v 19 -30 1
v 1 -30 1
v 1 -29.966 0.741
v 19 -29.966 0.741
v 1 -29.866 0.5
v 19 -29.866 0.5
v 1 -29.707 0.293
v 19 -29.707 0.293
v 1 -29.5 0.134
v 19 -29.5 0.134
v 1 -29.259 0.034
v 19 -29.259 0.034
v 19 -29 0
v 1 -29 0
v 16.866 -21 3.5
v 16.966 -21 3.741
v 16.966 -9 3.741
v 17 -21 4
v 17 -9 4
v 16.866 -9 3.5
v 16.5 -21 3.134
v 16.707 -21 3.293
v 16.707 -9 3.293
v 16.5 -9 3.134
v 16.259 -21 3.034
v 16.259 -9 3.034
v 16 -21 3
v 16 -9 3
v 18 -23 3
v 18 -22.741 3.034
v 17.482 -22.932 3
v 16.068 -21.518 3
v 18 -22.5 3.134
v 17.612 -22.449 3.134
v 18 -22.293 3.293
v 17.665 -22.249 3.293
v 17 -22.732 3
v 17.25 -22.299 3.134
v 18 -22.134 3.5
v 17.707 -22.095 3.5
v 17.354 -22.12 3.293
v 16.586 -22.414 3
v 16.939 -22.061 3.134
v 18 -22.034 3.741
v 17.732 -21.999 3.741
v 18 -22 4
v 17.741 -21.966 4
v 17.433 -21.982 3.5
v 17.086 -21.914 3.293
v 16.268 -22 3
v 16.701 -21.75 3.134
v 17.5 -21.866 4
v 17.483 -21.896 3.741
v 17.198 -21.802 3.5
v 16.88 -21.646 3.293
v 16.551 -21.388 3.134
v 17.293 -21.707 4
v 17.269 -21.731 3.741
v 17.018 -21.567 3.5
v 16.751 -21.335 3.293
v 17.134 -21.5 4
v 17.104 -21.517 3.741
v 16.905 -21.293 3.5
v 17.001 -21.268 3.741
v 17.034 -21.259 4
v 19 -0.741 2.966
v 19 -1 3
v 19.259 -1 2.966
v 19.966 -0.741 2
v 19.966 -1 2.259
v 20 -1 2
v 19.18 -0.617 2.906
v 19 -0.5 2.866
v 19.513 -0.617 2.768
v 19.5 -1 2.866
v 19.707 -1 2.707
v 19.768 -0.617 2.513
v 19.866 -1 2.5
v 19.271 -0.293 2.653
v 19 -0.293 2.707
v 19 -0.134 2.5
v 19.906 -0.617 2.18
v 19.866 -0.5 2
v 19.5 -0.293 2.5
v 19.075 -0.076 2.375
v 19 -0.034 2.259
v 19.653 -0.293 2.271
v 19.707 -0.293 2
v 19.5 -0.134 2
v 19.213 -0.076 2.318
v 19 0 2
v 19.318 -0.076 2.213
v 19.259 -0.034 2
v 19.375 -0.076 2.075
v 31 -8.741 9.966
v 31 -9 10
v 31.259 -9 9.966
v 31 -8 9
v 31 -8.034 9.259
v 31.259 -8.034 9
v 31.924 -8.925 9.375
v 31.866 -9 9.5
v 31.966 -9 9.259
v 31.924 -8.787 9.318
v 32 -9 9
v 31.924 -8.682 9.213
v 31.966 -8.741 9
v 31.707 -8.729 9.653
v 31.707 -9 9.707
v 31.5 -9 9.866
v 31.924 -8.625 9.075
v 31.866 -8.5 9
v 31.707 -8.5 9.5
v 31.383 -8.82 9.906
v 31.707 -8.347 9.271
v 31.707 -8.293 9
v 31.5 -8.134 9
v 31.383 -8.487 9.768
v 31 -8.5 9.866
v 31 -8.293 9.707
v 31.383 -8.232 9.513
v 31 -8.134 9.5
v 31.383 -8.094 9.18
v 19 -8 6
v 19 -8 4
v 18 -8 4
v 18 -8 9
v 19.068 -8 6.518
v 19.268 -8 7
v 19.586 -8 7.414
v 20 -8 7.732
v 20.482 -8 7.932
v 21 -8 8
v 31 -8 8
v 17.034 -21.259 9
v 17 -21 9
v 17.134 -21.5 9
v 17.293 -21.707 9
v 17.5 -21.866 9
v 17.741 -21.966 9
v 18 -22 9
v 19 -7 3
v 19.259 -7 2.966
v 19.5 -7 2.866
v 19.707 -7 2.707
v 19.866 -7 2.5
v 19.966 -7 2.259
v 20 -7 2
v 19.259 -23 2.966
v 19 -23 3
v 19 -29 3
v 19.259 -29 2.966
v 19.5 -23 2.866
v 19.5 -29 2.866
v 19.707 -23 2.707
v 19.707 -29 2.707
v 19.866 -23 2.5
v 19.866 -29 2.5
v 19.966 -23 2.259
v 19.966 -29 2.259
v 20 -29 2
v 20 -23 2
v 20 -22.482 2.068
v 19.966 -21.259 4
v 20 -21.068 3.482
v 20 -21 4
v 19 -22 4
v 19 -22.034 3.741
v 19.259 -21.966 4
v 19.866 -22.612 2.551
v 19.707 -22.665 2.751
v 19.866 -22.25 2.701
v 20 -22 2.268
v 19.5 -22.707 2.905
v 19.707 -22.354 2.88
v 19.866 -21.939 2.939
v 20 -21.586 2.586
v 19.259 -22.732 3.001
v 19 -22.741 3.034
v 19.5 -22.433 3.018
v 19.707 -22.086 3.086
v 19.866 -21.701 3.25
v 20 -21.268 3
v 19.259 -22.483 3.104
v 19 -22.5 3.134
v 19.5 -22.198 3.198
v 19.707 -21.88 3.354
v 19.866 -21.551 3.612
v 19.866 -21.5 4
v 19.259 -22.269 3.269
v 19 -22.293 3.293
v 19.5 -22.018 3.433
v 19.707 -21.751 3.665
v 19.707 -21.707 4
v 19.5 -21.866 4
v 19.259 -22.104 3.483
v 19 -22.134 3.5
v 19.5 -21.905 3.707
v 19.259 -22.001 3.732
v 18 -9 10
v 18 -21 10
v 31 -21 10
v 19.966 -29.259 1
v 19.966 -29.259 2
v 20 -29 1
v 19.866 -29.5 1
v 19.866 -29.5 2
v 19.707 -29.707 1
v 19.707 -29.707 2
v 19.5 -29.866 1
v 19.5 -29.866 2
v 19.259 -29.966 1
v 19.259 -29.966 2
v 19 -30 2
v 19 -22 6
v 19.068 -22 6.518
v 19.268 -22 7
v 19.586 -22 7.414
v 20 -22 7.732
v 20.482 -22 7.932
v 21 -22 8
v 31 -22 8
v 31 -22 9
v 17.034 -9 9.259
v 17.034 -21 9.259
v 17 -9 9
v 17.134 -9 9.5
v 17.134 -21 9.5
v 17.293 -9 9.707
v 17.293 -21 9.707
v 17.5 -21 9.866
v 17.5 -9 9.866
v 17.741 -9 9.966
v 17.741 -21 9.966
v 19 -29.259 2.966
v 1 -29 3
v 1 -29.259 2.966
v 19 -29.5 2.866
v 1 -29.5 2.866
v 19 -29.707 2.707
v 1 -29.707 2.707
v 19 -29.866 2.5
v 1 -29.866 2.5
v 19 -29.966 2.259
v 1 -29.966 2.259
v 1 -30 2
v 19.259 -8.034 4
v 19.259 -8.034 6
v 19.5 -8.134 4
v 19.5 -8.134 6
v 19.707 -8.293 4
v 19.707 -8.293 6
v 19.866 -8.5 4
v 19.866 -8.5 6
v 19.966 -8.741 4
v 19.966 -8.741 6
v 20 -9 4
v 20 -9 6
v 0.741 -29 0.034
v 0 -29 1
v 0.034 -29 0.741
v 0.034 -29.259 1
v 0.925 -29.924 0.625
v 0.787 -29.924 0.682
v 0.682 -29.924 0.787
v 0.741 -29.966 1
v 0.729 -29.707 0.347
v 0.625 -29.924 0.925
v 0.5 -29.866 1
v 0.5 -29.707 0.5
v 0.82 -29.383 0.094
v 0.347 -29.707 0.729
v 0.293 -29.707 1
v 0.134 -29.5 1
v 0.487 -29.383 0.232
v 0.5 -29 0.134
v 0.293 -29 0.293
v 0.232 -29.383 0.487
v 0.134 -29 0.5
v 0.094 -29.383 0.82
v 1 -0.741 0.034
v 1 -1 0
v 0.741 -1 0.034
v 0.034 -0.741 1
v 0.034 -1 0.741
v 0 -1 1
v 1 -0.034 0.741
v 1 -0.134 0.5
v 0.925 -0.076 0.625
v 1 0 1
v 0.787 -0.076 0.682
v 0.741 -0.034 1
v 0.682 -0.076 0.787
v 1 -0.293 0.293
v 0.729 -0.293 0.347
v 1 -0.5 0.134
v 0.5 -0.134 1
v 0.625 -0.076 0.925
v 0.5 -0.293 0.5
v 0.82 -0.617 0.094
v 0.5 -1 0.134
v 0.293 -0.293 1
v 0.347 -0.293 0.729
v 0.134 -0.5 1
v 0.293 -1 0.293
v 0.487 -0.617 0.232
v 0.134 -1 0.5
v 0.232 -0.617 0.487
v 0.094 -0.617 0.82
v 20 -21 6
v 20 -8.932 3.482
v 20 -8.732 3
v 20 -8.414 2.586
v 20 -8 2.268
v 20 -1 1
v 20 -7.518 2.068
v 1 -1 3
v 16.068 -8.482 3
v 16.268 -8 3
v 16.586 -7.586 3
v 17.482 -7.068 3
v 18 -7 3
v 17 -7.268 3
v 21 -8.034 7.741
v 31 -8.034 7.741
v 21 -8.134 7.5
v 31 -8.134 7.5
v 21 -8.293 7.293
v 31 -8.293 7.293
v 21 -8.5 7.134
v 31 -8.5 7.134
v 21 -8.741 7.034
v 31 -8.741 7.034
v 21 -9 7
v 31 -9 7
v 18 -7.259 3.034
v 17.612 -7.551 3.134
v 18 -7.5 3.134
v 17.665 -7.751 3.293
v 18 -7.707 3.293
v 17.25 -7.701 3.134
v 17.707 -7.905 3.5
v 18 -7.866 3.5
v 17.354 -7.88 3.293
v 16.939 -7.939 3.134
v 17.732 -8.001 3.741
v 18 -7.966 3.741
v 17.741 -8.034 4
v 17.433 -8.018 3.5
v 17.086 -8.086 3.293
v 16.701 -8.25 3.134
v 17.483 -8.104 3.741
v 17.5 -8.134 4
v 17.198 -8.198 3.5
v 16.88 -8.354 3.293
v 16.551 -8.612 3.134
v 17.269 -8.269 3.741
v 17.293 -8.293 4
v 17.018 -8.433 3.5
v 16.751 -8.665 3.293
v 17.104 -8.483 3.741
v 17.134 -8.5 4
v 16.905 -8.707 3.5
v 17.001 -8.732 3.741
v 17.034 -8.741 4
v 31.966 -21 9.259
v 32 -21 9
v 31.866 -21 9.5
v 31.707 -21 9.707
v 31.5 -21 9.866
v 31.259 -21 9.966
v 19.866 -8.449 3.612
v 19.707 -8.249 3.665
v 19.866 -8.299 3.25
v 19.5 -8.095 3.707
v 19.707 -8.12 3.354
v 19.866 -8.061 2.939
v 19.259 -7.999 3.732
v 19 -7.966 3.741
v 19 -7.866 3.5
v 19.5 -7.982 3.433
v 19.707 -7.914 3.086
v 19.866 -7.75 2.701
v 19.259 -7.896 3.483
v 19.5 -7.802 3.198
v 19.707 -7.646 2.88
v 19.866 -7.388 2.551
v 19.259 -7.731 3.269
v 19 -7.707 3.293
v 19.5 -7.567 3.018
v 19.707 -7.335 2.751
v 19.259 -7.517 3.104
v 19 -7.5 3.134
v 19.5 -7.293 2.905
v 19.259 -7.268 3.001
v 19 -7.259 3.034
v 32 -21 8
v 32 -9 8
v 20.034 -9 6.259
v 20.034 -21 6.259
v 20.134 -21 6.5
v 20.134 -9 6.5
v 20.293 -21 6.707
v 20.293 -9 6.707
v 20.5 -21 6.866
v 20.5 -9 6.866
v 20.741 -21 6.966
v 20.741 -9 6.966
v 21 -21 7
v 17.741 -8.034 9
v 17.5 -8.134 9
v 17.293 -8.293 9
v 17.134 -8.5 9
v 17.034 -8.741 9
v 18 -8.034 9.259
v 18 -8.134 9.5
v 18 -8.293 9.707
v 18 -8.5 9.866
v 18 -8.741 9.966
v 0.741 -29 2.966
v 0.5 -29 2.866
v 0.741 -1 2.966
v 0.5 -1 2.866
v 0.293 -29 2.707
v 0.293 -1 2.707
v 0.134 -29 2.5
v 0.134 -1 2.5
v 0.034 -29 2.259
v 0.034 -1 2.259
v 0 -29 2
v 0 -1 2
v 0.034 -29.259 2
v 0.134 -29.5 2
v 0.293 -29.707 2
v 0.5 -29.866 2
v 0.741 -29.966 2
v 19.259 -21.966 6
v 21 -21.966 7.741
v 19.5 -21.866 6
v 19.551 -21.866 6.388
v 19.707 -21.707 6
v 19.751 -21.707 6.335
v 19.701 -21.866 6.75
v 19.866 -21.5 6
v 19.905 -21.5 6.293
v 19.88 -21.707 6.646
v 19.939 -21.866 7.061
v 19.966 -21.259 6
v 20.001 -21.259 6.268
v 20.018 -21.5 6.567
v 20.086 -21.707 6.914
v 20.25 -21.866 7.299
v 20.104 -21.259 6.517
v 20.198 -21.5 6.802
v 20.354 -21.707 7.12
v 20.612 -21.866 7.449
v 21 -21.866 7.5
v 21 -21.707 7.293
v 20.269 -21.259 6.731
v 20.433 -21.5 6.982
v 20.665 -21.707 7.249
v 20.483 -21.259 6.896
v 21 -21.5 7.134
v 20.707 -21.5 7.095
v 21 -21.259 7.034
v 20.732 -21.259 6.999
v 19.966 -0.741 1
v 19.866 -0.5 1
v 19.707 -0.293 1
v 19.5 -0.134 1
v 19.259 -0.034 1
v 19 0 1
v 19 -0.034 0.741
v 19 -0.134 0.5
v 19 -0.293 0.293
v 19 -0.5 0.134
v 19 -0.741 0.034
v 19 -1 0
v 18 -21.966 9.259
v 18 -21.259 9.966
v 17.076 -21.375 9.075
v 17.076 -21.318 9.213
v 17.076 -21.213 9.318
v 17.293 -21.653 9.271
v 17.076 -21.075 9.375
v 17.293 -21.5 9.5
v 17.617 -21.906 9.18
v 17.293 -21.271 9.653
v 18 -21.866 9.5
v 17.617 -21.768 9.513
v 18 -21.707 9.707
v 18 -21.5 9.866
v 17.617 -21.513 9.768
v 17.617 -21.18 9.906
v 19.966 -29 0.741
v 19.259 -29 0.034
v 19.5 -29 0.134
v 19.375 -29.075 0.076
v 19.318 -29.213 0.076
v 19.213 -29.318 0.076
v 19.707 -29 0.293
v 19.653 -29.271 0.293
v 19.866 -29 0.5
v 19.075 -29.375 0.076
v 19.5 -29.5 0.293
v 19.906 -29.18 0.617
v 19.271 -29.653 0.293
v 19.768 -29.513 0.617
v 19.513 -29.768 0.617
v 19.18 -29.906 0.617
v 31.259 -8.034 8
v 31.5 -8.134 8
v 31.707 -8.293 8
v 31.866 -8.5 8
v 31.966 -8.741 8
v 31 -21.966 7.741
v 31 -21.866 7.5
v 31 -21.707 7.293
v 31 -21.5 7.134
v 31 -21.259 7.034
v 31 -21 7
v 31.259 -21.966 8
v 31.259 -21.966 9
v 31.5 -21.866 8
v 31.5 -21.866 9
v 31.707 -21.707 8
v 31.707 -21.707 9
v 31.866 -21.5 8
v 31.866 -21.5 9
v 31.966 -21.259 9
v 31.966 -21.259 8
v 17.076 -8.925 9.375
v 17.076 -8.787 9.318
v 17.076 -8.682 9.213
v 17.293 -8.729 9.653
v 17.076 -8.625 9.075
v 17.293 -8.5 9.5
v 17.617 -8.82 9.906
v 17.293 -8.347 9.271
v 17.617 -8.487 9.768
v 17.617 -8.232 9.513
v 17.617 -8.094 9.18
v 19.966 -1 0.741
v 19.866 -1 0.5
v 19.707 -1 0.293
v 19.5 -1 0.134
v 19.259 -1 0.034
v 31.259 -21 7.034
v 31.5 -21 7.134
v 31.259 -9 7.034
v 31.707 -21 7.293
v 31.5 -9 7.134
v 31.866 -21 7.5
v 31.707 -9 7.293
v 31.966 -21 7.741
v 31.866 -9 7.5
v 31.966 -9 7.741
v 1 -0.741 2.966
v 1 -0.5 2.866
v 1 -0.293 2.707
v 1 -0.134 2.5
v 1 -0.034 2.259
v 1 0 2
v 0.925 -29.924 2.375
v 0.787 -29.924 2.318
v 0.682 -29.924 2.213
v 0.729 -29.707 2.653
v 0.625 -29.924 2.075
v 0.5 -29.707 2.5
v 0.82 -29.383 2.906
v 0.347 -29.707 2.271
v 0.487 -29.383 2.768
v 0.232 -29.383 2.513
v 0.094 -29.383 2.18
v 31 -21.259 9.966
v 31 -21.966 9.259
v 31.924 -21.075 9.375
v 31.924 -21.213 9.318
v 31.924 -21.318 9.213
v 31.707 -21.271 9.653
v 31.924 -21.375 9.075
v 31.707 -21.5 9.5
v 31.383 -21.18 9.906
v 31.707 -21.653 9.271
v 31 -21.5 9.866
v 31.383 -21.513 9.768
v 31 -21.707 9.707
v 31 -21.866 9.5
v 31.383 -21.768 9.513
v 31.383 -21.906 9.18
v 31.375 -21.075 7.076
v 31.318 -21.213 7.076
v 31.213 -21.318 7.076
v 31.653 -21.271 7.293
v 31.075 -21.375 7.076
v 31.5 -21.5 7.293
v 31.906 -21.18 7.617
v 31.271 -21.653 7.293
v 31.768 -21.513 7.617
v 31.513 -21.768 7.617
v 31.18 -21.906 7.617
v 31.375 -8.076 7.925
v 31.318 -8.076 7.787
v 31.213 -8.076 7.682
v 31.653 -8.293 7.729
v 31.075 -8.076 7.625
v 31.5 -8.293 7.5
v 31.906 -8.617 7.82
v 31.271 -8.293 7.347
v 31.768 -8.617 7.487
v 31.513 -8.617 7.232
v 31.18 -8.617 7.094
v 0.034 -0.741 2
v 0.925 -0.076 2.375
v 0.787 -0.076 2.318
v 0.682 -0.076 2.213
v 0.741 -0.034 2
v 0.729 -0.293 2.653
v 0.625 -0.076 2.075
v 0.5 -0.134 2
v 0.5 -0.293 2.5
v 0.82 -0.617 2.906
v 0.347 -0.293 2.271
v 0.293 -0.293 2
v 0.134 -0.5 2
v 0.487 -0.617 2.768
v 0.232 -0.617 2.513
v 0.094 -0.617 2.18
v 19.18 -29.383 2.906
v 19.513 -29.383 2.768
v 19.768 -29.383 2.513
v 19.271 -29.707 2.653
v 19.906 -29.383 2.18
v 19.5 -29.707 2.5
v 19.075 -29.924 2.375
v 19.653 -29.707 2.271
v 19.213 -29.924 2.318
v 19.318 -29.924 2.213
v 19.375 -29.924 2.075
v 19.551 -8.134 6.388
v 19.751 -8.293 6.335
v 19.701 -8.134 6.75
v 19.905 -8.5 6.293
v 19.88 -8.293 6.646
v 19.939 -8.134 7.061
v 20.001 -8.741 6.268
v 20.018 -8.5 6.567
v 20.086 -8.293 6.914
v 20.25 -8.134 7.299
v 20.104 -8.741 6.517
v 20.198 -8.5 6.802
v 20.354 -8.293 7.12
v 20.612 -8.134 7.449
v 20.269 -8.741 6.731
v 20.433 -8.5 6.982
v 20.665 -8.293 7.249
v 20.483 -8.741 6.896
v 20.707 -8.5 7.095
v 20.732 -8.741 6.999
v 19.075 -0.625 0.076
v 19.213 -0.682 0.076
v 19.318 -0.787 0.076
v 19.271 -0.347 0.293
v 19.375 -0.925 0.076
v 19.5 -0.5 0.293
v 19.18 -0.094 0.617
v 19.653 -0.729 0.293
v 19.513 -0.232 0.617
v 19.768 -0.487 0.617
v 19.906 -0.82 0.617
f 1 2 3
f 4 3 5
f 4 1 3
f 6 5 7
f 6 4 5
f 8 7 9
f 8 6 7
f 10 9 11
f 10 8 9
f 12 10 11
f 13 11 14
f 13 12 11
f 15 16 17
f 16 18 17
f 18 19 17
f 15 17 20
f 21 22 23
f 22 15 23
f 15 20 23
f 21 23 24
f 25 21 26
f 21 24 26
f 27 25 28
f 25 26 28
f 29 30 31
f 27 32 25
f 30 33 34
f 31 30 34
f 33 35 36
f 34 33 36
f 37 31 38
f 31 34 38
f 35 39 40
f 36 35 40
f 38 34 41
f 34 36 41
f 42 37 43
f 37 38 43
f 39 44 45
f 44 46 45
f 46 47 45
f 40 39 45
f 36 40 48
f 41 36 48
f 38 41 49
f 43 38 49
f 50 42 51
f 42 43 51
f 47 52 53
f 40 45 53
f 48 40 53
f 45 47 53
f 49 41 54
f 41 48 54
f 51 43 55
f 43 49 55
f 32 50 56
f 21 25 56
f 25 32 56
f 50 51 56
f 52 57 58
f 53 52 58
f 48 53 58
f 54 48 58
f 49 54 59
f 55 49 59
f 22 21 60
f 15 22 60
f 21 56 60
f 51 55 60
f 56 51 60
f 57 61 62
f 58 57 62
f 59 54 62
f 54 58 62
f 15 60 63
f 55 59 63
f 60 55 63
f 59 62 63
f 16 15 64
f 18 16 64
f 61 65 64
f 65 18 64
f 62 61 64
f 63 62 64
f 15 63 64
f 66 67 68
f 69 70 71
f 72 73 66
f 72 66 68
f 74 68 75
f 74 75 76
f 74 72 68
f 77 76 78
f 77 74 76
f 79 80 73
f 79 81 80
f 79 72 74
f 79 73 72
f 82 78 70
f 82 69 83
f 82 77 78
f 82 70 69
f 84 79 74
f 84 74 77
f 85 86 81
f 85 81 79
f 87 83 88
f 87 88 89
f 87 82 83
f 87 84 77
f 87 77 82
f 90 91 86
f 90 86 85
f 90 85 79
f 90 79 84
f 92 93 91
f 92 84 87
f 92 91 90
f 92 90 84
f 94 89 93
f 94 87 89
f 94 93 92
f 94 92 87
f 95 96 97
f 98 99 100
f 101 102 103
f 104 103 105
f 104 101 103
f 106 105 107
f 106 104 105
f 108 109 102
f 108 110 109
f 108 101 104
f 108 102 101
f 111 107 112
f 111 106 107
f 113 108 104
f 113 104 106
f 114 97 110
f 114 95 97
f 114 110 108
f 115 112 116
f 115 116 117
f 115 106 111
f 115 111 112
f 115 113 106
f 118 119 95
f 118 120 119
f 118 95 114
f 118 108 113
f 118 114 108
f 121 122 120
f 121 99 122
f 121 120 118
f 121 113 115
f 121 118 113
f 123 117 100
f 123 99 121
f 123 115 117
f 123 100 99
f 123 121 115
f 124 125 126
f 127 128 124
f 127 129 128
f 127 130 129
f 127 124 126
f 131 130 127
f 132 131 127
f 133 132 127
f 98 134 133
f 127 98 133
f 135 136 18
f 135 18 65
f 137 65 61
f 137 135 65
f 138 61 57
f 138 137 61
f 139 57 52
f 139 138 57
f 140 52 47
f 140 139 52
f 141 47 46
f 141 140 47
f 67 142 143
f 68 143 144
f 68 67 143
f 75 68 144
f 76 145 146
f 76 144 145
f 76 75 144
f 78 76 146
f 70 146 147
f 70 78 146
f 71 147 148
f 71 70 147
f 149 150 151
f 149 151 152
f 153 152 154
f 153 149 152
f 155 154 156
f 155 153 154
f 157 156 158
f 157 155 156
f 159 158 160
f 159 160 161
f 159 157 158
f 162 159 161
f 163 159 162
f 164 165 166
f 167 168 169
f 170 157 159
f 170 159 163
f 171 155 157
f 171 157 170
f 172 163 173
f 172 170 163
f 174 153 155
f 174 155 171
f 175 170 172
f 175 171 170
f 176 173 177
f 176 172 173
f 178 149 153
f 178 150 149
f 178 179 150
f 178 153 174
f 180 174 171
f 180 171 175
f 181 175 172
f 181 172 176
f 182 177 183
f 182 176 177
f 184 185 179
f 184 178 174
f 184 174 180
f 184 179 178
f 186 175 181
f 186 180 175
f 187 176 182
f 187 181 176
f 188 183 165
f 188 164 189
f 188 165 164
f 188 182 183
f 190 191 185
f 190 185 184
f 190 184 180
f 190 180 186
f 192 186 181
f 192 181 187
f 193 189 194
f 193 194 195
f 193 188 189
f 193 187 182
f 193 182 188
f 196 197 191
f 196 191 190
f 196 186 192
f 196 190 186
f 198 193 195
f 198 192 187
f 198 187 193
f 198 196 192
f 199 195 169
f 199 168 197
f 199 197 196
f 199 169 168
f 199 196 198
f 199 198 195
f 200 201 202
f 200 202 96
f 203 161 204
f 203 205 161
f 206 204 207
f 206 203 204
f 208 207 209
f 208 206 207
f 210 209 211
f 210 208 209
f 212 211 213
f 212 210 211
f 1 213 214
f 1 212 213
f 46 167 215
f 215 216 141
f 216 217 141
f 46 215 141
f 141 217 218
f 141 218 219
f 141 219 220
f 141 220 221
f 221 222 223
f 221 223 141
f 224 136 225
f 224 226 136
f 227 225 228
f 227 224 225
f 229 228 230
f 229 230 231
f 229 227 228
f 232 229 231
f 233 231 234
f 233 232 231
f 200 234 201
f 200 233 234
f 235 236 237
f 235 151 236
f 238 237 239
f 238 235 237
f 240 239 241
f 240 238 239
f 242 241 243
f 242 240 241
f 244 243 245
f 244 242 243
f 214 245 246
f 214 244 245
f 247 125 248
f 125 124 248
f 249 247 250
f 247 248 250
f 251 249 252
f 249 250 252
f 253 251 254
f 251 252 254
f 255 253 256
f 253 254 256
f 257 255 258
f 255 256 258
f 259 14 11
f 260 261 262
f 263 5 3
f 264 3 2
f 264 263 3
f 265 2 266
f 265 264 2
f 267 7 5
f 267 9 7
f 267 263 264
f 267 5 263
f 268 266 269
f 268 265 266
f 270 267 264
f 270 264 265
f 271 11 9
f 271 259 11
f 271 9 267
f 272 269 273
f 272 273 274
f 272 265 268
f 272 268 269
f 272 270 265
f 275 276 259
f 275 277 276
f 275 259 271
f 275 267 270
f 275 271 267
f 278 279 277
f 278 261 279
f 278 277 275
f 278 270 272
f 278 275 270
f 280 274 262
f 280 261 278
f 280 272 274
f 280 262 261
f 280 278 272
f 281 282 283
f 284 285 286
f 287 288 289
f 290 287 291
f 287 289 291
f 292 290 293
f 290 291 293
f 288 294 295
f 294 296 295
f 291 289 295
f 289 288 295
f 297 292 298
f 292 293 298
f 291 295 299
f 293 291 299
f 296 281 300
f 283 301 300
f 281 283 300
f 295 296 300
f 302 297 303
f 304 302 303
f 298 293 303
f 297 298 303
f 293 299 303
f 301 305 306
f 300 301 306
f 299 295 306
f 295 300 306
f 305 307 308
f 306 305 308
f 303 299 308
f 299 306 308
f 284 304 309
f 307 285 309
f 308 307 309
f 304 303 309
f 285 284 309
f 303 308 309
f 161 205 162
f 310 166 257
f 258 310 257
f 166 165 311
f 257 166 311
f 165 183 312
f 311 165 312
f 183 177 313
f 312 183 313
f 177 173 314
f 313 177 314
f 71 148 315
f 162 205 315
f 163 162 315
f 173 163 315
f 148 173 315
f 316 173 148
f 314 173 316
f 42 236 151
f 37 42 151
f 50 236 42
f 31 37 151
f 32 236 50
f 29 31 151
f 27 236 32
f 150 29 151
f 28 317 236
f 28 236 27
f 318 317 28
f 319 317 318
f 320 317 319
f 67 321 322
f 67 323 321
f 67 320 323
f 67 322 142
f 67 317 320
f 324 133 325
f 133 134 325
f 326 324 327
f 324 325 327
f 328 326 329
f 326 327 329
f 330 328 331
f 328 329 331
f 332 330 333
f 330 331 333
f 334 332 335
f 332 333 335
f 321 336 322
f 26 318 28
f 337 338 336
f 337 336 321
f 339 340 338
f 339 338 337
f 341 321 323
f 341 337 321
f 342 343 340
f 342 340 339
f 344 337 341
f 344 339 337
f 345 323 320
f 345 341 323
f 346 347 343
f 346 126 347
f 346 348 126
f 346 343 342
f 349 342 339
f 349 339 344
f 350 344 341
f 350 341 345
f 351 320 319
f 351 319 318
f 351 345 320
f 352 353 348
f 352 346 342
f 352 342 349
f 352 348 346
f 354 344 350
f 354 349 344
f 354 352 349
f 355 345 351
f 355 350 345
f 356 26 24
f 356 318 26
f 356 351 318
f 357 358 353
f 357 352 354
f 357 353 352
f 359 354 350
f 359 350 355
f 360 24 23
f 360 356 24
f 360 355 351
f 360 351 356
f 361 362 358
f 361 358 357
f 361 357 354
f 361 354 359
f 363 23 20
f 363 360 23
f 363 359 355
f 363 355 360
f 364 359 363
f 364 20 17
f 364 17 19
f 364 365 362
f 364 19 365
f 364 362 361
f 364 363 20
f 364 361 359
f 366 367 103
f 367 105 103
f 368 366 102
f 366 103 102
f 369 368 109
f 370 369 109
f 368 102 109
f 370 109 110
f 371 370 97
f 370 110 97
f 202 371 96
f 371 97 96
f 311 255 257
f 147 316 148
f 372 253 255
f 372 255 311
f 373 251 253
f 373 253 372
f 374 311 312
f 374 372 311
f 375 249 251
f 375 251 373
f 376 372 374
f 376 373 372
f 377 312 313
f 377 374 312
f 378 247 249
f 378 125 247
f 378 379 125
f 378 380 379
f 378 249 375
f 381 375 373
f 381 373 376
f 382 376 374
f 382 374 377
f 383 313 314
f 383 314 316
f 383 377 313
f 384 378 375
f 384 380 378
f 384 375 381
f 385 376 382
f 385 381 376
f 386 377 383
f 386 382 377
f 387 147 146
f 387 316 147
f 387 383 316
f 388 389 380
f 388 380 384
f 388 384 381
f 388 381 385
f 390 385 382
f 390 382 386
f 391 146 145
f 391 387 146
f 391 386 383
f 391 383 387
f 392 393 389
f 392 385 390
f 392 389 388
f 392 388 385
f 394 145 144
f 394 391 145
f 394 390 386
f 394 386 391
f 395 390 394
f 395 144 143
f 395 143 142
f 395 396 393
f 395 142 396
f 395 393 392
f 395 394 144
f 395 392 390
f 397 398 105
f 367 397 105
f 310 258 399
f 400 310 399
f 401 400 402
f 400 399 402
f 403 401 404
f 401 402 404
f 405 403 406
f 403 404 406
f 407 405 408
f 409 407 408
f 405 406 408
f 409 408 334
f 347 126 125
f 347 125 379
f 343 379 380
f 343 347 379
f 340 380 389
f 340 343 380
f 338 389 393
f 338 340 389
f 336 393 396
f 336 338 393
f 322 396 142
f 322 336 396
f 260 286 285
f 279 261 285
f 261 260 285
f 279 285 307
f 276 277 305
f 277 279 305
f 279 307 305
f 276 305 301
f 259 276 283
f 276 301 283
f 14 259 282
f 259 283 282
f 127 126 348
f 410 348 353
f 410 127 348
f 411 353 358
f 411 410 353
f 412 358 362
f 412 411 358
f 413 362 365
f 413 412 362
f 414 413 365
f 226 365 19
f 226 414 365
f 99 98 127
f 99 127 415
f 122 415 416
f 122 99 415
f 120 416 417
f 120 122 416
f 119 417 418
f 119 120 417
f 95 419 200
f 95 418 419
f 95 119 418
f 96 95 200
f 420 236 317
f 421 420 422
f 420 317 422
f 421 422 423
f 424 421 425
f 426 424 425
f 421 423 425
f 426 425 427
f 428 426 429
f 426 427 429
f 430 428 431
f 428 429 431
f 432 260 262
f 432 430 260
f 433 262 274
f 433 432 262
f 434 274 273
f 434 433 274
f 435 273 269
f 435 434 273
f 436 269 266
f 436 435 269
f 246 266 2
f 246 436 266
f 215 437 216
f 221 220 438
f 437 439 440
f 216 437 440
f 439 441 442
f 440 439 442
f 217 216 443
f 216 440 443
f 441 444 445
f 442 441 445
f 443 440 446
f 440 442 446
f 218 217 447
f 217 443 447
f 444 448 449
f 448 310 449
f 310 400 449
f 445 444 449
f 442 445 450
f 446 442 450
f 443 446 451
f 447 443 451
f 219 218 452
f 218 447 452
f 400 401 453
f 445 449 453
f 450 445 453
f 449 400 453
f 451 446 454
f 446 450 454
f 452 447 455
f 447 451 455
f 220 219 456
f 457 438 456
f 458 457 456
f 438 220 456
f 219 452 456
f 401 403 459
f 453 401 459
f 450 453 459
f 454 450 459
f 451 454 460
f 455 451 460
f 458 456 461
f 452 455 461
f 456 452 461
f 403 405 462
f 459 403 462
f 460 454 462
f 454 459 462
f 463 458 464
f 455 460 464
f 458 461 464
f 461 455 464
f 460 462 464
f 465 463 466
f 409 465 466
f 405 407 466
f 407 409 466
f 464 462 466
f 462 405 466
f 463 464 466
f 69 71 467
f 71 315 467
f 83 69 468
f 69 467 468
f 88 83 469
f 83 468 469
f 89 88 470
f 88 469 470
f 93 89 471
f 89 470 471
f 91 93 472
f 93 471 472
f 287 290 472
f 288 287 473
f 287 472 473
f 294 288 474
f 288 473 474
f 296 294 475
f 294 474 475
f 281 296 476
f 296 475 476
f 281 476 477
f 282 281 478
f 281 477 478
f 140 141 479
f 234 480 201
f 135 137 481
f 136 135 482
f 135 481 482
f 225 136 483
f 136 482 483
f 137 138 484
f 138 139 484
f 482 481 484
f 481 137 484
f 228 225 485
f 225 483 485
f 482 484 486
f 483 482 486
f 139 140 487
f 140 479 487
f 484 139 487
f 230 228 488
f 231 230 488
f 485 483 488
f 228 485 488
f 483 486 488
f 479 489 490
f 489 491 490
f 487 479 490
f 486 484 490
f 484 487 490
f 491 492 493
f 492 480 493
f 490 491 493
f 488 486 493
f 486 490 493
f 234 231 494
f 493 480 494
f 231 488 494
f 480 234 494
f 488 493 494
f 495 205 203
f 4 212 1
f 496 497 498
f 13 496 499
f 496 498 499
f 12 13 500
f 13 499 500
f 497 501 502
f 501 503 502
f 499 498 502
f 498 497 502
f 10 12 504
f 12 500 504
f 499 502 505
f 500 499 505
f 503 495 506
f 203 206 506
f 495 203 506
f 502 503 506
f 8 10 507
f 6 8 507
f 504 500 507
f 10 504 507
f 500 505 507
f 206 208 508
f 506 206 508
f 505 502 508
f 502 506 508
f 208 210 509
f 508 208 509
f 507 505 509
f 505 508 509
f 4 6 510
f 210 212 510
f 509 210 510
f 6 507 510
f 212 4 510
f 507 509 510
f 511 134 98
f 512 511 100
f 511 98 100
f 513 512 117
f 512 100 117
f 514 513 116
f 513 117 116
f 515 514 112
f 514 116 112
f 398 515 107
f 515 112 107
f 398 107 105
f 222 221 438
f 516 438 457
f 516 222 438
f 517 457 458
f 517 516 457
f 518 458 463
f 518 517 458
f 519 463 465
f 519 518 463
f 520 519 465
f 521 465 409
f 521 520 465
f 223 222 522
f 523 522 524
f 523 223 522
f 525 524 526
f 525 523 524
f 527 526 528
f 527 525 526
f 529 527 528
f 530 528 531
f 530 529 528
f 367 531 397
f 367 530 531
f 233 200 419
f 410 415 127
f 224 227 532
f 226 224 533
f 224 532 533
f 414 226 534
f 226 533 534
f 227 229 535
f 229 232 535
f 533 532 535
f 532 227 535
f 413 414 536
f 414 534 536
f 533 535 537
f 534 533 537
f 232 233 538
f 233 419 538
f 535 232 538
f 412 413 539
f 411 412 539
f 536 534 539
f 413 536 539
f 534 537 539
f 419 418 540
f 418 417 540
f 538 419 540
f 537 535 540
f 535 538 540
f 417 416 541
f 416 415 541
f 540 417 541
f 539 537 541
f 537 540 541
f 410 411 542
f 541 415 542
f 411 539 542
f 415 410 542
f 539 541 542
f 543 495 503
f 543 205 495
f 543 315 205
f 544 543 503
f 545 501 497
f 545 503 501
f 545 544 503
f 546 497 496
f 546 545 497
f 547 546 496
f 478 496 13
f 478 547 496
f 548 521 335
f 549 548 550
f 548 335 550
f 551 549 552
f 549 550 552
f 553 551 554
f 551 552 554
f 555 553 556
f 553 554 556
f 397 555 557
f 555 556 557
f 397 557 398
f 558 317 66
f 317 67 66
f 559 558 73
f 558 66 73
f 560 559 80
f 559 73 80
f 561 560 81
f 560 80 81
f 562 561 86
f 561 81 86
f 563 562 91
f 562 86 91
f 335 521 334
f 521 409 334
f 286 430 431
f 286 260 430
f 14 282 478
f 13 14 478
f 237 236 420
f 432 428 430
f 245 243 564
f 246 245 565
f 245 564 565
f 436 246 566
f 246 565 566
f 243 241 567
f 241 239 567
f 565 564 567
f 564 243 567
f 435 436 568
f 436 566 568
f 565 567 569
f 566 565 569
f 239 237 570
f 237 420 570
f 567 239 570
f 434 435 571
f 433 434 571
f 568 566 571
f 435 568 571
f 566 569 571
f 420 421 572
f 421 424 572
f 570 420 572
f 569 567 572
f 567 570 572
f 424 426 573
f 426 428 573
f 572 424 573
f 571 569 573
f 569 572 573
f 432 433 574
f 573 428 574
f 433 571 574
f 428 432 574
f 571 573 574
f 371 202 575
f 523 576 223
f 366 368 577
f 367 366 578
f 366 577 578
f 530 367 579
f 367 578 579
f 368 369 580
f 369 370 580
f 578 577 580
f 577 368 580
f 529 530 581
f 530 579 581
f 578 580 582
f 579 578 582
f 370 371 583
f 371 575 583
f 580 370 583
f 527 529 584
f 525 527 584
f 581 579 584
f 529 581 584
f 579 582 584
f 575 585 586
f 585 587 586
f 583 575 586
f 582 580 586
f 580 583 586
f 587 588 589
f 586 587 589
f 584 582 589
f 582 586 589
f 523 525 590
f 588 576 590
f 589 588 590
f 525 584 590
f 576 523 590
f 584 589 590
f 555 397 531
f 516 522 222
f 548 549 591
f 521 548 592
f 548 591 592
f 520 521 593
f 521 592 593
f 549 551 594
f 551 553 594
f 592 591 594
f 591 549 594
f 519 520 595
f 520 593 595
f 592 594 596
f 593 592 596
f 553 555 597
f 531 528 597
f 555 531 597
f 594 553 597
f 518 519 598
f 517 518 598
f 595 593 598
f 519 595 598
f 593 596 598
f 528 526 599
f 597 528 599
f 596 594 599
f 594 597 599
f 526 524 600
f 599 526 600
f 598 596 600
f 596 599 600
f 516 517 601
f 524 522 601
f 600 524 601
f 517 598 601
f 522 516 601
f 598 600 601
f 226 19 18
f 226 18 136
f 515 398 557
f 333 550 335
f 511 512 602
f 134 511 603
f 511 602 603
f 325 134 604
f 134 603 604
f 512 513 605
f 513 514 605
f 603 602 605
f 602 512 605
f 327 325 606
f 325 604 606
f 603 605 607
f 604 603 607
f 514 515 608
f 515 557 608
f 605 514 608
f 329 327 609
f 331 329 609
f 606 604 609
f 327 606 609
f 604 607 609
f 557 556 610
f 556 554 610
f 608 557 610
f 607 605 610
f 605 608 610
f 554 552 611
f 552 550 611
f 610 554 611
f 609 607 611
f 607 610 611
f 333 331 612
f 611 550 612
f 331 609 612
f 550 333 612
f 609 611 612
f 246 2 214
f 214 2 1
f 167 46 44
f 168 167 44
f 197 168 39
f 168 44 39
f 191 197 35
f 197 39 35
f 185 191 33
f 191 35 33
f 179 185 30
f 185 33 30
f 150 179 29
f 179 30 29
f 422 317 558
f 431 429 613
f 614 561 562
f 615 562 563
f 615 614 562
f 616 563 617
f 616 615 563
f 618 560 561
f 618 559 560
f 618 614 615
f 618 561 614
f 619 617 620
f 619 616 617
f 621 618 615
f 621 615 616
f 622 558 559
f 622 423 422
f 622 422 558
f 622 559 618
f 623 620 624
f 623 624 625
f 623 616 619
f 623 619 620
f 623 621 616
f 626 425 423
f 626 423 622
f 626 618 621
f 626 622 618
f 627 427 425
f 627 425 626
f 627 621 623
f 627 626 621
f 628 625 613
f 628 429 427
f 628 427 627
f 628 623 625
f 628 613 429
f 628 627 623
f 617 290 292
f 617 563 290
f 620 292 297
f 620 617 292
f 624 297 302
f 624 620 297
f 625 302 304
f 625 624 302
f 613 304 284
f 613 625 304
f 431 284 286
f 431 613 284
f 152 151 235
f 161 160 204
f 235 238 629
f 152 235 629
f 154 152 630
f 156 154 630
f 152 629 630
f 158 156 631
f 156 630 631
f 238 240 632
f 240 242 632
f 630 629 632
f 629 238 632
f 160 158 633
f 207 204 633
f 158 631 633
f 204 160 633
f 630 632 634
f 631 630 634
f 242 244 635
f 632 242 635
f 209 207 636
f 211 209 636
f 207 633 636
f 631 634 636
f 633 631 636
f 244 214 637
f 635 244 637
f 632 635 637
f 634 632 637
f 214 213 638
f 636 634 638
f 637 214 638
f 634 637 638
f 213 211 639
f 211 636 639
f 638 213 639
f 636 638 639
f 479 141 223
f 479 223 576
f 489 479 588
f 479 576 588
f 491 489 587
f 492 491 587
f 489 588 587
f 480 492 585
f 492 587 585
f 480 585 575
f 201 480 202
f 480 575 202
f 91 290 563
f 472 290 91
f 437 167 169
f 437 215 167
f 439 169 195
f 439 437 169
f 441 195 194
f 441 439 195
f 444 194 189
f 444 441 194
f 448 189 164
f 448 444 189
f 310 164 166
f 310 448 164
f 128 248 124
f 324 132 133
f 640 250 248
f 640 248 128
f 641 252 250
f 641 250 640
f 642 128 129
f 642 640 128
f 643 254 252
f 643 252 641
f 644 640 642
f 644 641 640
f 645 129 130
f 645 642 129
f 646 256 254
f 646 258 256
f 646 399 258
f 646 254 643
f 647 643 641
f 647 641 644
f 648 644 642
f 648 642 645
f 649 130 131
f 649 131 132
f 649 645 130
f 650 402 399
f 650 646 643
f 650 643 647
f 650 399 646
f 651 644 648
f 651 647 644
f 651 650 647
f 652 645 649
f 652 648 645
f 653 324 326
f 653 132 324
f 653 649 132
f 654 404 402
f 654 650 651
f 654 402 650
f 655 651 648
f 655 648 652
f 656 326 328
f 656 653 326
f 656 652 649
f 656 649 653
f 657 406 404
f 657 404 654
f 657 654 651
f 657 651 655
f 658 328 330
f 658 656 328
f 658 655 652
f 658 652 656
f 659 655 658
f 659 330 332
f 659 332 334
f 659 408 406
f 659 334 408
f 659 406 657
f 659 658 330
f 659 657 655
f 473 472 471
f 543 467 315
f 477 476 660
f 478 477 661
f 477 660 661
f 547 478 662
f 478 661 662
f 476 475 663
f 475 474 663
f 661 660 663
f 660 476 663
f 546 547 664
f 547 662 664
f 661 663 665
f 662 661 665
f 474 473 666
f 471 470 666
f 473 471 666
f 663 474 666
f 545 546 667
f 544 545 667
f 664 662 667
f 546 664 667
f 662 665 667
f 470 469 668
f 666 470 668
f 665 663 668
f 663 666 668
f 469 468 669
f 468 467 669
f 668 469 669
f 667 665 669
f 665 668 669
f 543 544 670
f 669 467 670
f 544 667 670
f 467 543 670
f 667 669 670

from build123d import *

# Parameters (mm, degrees)
SKETCH1_W           = 20
SKETCH1_H           = 30
BOSS_EXTRUDE1_DEPTH = 3
SKETCH3_W           = 7
SKETCH3_H           = 14
BOSS_EXTRUDE2_DEPTH = 3
SKETCH4_W           = 3
SKETCH4_H           = 14
BOSS_EXTRUDE3_DEPTH = 15
FILLET1_R           = 1
FILLET2_R           = 1


with BuildPart() as part:
    # Sketch1 → Boss-Extrude1 (new body)
    with BuildSketch(Plane.XY):
        with Locations((10, -15)):
            Rectangle(SKETCH1_W, SKETCH1_H)
    extrude(amount=BOSS_EXTRUDE1_DEPTH)

    # Sketch3 → Boss-Extrude2 (add)
    with BuildSketch(Plane.ZY.offset(-20)):
        with Locations((6.5, -15)):
            Rectangle(SKETCH3_W, SKETCH3_H)
    extrude(amount=BOSS_EXTRUDE2_DEPTH)

    # Sketch4 → Boss-Extrude3 (add)
    with BuildSketch(Plane.ZY.offset(-17)):
        with Locations((8.5, -15)):
            Rectangle(SKETCH4_W, SKETCH4_H)
    extrude(amount=-BOSS_EXTRUDE3_DEPTH)

    # Fillet1
    fillet1_edges = [part.edges().sort_by_distance(p)[0] for p in [
        (20, -4, 3),
        (18.5, -8, 3),
        (20, -22, 5),
        (18.5, -22, 3),
        (24.5, -22, 10),
        (24.5, -8, 10),
        (17, -15, 3),
        (17, -22, 6.5),
        (17, -15, 10),
        (17, -8, 6.5),
        (20, -8, 5),
        (32, -15, 10),
        (32, -22, 8.5),
        (32, -15, 7),
        (26, -22, 7),
        (32, -8, 8.5),
        (26, -8, 7),
        (20, -15, 7),
        (20, -26, 3),
    ]]
    fillet(fillet1_edges, radius=FILLET1_R)

    # Fillet2
    fillet2_edges = [part.edges().sort_by_distance(p)[0] for p in [
        (0, -15, 3),
        (9.5, 0, 3),
        (9.5, -30, 3),
        (0, -15, 0),
        (20, -30, 1),
        (20, 0, 1),
        (10, 0, 0),
        (19.707106781, -30, 2.707106781),
        (19.707106781, 0, 2.707106781),
        (20, -15, 0),
        (10, -30, 0),
        (0, -30, 1.5),
        (0, 0, 1.5),
    ]]
    fillet(fillet2_edges, radius=FILLET2_R)


solid = part.part
